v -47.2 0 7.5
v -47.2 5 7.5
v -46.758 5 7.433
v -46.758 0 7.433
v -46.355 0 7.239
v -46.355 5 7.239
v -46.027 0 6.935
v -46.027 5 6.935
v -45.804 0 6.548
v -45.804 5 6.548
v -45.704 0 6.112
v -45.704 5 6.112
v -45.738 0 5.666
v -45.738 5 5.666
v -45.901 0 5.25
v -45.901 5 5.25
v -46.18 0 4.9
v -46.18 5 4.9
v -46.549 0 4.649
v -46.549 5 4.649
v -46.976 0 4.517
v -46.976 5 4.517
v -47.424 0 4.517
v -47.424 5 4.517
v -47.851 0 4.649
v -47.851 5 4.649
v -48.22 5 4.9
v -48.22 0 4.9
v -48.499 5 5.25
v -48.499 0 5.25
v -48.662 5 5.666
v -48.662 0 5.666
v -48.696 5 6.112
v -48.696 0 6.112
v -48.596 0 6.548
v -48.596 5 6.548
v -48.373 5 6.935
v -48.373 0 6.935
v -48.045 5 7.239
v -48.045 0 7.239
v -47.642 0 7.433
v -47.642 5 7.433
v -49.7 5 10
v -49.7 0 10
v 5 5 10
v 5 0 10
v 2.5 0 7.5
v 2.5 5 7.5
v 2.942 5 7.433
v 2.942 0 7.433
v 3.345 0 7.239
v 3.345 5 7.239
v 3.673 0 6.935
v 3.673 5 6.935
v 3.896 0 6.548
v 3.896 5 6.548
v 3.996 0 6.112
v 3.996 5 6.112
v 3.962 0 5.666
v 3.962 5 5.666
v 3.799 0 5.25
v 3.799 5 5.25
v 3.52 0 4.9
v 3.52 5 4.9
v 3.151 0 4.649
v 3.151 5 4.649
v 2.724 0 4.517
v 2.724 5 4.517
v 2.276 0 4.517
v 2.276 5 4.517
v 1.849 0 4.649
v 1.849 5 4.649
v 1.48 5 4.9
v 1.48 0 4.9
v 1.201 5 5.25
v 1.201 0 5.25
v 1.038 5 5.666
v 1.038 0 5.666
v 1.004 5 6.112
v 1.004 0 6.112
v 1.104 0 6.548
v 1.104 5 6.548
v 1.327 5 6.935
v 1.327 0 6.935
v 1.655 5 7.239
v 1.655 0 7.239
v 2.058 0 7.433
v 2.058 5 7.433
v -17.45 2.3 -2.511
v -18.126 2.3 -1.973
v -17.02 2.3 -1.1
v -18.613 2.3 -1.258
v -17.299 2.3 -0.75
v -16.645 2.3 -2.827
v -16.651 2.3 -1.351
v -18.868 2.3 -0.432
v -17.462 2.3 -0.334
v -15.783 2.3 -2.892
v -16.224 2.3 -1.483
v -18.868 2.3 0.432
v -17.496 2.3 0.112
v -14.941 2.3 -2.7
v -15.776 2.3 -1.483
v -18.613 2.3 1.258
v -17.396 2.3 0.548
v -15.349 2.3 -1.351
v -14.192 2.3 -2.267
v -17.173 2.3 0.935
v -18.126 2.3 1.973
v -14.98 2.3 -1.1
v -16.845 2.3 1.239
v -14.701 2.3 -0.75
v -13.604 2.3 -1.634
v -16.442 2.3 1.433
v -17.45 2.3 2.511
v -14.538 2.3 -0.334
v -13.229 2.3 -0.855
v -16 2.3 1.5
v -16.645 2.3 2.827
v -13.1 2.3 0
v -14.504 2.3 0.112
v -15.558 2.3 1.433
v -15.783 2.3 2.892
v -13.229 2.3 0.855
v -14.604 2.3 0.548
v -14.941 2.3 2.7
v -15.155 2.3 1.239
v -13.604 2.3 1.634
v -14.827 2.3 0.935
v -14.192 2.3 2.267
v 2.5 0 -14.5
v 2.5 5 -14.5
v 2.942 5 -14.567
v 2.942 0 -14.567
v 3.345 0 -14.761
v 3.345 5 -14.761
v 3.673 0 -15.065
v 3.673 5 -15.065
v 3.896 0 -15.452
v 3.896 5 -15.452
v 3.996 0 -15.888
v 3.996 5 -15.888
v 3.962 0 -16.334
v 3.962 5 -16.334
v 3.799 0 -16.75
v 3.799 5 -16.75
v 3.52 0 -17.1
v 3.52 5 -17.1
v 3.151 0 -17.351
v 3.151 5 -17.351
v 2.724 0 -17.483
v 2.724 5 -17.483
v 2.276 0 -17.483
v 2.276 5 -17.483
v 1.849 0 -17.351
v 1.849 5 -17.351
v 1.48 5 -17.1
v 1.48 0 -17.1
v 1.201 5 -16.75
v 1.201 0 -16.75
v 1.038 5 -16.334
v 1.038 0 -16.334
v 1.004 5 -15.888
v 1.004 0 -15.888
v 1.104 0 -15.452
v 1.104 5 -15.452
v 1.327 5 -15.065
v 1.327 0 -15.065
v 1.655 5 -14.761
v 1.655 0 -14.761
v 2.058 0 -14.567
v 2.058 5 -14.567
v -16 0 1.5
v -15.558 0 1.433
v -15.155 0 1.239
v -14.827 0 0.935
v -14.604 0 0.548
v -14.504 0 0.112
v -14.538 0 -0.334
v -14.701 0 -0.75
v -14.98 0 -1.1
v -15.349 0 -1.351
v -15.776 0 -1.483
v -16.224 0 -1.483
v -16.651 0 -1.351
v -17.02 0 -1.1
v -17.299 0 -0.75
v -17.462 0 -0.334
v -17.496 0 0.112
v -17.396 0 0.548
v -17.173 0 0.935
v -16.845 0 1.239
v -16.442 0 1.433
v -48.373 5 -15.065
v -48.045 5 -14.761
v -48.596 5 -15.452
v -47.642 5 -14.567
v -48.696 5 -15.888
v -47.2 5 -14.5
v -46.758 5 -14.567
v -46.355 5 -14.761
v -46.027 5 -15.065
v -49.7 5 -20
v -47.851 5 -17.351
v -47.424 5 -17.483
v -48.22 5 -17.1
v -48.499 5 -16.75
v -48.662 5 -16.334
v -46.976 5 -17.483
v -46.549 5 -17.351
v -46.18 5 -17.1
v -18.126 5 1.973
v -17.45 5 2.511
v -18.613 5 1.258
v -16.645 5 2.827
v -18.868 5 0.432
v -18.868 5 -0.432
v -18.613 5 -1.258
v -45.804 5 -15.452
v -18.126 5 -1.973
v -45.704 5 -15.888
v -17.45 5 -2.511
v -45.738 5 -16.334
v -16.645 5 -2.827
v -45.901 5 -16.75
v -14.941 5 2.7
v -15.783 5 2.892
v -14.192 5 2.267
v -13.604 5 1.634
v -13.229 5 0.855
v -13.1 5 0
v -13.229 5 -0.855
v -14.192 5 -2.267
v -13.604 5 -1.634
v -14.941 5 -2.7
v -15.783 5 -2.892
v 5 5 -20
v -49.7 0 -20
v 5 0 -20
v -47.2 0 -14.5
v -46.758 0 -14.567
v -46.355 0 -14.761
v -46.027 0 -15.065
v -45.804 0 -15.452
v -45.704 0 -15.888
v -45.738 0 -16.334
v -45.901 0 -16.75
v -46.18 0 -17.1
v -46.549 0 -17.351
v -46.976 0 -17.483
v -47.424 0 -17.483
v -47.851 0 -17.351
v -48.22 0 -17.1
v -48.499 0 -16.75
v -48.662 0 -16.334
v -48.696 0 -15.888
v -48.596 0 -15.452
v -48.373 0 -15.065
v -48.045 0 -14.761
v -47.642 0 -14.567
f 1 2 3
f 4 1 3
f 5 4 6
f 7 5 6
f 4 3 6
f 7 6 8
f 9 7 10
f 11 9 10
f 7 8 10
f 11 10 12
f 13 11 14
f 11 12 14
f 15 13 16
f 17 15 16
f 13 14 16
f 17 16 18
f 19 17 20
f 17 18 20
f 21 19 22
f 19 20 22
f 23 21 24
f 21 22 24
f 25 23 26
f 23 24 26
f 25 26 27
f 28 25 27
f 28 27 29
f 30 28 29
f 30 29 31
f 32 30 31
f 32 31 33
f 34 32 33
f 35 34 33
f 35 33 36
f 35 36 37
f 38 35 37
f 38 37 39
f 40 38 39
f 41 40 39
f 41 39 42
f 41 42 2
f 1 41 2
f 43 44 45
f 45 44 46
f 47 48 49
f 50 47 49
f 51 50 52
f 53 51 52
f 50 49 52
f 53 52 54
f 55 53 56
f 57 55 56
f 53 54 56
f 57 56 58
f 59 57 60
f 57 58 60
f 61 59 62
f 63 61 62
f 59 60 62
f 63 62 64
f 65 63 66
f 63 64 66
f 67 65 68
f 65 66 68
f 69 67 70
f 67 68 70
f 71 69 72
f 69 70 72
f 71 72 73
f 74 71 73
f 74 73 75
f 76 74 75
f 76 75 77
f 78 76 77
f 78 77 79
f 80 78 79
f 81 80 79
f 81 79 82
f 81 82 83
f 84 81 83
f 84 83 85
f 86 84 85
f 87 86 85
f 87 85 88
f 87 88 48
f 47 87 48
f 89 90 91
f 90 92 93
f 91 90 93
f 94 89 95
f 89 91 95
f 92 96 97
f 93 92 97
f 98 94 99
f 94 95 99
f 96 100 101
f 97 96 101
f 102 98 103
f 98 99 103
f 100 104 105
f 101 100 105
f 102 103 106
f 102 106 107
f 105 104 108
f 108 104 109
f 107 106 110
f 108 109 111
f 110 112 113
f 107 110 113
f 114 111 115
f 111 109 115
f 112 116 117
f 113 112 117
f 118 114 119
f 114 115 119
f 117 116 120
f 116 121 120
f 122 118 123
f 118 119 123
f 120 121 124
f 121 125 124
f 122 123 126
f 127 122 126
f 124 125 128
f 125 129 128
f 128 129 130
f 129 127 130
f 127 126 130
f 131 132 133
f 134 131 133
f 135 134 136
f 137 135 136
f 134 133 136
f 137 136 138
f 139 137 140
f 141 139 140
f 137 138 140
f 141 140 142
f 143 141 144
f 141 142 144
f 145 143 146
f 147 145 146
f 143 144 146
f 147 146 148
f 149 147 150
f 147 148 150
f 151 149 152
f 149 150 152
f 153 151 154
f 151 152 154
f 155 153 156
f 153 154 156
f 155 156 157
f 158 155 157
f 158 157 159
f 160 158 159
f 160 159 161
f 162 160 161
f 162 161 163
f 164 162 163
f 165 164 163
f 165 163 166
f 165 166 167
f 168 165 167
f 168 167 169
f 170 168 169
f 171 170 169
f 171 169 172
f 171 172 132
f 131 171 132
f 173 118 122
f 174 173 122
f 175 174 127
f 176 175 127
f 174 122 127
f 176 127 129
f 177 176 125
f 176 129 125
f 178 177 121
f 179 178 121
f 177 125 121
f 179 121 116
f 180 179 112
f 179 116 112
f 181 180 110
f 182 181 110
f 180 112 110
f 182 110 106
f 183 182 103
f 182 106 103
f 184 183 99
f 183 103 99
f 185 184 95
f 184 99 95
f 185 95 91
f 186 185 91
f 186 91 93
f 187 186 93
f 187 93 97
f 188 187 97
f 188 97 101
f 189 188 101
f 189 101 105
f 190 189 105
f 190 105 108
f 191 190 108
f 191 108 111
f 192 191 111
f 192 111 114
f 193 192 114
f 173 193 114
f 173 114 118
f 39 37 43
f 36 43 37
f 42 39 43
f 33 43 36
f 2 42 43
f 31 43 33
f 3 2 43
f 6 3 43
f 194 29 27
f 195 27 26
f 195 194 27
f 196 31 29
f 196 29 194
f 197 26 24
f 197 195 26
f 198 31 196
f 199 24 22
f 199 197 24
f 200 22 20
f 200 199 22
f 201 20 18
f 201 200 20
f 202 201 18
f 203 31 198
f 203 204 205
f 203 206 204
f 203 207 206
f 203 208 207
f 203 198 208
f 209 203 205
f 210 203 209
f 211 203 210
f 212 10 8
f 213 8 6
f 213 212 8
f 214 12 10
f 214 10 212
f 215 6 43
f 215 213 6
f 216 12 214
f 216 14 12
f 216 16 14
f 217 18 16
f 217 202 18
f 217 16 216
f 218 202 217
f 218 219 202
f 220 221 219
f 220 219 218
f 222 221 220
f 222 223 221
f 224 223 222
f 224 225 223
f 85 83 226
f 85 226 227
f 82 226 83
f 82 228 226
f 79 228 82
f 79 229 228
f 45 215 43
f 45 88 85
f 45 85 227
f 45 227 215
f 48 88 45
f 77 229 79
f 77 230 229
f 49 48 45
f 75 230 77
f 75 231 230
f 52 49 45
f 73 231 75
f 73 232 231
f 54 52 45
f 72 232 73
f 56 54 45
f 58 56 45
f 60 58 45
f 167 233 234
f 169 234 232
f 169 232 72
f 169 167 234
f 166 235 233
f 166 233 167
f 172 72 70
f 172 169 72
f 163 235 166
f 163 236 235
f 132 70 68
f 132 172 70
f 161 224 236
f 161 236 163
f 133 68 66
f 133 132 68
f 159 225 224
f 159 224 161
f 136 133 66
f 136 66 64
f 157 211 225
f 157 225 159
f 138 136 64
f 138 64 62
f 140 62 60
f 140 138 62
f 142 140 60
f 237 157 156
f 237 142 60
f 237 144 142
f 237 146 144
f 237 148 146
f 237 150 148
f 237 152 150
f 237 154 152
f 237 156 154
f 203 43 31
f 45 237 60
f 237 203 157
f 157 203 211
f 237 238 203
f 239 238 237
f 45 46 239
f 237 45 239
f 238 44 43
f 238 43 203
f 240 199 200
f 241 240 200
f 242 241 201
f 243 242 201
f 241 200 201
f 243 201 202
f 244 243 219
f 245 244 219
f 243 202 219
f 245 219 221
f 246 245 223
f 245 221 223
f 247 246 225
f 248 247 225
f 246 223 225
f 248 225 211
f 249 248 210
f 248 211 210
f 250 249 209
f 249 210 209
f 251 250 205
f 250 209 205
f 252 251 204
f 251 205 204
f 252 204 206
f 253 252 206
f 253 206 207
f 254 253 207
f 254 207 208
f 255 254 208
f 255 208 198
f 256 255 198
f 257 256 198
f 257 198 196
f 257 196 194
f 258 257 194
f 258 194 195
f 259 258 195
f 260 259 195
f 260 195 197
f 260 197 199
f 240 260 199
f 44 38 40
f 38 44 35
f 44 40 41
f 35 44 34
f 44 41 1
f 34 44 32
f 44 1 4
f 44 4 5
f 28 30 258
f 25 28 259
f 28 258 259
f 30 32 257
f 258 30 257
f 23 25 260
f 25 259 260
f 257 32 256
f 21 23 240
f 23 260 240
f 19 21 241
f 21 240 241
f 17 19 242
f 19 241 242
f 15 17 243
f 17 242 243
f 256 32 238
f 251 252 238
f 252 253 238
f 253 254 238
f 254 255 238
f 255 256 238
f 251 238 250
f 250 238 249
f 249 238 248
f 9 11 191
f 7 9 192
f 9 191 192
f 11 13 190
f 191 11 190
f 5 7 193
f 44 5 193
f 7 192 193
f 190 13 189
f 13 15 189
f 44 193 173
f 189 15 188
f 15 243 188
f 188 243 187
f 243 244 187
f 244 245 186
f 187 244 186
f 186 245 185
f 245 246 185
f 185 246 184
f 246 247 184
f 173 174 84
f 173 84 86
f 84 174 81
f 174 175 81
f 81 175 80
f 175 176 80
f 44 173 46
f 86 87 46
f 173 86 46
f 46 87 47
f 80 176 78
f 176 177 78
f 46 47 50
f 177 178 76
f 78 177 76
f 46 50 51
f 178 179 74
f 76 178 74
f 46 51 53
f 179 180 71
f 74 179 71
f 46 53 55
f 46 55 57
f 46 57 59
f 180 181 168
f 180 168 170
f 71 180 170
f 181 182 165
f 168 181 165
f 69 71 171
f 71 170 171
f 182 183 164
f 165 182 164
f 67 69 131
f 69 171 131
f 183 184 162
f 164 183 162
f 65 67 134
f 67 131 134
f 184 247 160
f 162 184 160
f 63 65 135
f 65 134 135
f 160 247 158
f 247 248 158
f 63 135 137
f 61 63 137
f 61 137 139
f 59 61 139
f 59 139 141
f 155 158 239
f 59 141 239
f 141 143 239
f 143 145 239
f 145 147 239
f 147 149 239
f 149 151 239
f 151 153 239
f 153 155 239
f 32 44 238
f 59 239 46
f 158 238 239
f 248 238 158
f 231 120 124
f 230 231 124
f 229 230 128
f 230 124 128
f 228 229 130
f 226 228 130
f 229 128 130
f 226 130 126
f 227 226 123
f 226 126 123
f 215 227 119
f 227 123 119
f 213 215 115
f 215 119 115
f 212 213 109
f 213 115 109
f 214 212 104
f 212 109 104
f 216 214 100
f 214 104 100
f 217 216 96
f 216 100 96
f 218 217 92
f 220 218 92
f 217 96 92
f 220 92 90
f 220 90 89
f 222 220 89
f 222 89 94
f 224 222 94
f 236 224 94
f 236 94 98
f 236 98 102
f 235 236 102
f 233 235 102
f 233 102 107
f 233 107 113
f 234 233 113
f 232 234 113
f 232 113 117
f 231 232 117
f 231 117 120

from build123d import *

# Parameters (mm, degrees)
ESQUISSE1_W             = 54.7
ESQUISSE1_H             = 30
EXTRUSION1_DEPTH        = 5
ESQUISSE2_R             = 1.5
ENL_V_MAT_EXTRU_1_DEPTH = 54.806040553
ESQUISSE3_R             = 2.9
ENL_V_MAT_EXTRU_2_DEPTH = 54.641215497
ESQUISSE4_R             = 1.5
ENL_V_MAT_EXTRU_3_DEPTH = 54.806040553


with BuildPart() as part:
    # Esquisse1 → Extrusion1 (new body)
    with BuildSketch(Plane(origin=(0, 0, 0), x_dir=(1, 0, 0), z_dir=(0, 1, 0))):
        with Locations((-22.35, 5)):
            Rectangle(ESQUISSE1_W, ESQUISSE1_H)
    extrude(amount=EXTRUSION1_DEPTH)

    # Esquisse2 → Enlèv. mat.-Extru.1 (cut, through all)
    with BuildSketch(Plane(origin=(0, 5, 0), x_dir=(1, 0, 0), z_dir=(0, 1, 0))):
        with Locations(Location((-16, 0, 0), (0, 0, 270))):
            Circle(ESQUISSE2_R)
    extrude(amount=-ENL_V_MAT_EXTRU_1_DEPTH, mode=Mode.SUBTRACT)

    # Esquisse3 → Enlèv. mat.-Extru.2 (cut, through all)
    with BuildSketch(Plane.XZ.offset(-2.3)):
        with Locations((-16, 0)):
            Circle(ESQUISSE3_R)
    extrude(amount=-ENL_V_MAT_EXTRU_2_DEPTH, mode=Mode.SUBTRACT)

    # Esquisse4 → Enlèv. mat.-Extru.3 (cut, through all)
    with BuildSketch(Plane(origin=(0, 5, 0), x_dir=(1, 0, 0), z_dir=(0, 1, 0))):
        with Locations(Location((2.5, -6, 0), (0, 0, 270))):
            Circle(ESQUISSE4_R)
        with Locations(Location((2.5, 16, 0), (0, 0, 270))):
            Circle(ESQUISSE4_R)
        with Locations(Location((-47.2, 16, 0), (0, 0, 270))):
            Circle(ESQUISSE4_R)
        with Locations(Location((-47.2, -6, 0), (0, 0, 270))):
            Circle(ESQUISSE4_R)
    extrude(amount=-ENL_V_MAT_EXTRU_3_DEPTH, mode=Mode.SUBTRACT)


solid = part.part
